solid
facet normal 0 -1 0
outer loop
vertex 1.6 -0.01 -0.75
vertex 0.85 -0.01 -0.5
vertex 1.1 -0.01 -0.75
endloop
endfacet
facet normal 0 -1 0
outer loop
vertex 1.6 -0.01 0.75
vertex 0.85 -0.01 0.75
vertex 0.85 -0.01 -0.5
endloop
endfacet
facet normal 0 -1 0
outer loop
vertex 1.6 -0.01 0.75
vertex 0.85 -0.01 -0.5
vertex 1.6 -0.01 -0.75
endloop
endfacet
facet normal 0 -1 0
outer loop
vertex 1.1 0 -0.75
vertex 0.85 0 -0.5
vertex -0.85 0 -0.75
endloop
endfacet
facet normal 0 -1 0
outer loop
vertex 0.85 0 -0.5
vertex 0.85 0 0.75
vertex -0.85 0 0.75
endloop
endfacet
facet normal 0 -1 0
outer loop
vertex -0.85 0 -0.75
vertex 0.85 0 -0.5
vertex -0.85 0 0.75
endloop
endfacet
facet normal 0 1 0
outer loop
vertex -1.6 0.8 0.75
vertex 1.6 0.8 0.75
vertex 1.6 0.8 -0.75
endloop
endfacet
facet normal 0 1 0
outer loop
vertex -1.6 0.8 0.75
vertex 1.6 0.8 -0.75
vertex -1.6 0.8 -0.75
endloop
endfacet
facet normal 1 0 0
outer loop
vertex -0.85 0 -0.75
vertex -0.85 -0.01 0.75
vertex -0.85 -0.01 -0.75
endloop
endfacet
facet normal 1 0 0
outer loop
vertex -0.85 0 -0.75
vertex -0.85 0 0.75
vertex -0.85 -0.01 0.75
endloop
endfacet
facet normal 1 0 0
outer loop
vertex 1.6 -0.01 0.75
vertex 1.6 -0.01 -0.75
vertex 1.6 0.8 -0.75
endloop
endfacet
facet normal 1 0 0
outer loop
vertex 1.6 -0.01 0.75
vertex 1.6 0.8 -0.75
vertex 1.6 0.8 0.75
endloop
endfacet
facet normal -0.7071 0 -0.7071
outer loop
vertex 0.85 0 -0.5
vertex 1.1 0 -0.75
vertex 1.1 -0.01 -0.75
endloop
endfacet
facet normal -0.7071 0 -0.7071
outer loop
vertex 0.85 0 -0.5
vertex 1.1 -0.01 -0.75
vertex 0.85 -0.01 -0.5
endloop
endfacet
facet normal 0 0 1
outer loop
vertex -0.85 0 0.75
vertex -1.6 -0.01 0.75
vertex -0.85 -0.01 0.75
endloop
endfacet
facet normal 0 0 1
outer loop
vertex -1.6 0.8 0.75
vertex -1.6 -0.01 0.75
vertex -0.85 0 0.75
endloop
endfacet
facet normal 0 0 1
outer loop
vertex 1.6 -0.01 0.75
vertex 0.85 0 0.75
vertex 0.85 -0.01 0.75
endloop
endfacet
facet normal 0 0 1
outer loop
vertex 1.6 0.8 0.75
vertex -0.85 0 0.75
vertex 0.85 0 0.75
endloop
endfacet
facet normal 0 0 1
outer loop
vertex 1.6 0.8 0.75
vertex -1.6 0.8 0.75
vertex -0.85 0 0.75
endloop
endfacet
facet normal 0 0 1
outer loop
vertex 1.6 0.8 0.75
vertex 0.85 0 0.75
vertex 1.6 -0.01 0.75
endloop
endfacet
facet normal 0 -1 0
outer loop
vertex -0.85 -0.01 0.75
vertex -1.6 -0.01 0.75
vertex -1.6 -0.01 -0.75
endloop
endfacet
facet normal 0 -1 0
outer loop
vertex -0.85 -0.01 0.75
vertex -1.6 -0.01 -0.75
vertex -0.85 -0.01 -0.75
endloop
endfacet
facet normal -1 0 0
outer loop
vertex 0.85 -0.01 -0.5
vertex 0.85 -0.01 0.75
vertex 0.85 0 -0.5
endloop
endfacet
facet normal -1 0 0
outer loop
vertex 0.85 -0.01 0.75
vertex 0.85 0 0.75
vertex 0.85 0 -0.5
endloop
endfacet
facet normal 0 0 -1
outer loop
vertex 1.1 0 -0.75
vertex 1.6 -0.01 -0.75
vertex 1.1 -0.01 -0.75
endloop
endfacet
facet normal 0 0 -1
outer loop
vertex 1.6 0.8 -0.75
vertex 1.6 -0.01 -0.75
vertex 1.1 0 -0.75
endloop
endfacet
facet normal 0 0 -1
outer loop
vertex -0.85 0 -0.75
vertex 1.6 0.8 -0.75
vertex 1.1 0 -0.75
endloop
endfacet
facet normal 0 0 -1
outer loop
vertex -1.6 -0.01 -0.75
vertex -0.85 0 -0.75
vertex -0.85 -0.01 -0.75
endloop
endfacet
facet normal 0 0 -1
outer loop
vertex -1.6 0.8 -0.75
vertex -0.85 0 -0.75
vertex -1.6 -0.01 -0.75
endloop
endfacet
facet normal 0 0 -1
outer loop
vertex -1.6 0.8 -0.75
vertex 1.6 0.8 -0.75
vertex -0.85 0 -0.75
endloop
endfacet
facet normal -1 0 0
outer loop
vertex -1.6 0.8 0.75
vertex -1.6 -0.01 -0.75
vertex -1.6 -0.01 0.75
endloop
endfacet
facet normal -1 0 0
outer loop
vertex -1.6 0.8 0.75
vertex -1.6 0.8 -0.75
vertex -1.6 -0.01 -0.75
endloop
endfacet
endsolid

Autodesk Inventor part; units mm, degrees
ref_plane "YZ Plane" through (0, 0, 0) normal (1, 0, 0) x (0, 1, 0)
ref_plane "XZ Plane" through (0, 0, 0) normal (0, 1, 0) x (-1, 0, 0)
ref_plane "XY Plane" through (0, 0, 0) normal (0, 0, 1) x (1, 0, 0)
sketch "Sketch1" plane through (0, 0, 0) normal (0, 1, 0) x (-1, 0, 0)
  line L0 (1.6, -0.75) -> (-1.6, -0.75)
  line L1 (-1.6, -0.75) -> (-1.6, 0.75)
  line L2 (-1.6, 0.75) -> (1.6, 0.75)
  line L3 (1.6, 0.75) -> (1.6, -0.75)
  line L4 (1.6, -0.75) -> (-1.6, 0.75) construction
  line L5 (-1.6, -0.75) -> (1.6, 0.75) construction
  point P0 (0, 0)
  dimension "d2" = 3.2
  dimension "d3" = 1.5
extrude "Extrusion1" add sketch "Sketch1" along normal blind 0.8
sketch "Sketch2" plane through (0, 0, 0) normal (0, -1, 0) x (1, 0, 0)
  line L0 (1.6, 0.75) -> (1.6, -0.75) projected
  line L1 (1.6, 0.75) -> (0.85, 0.75)
  line L2 (0.85, 0.75) -> (0.85, -0.5)
  line L3 (1.1, -0.75) -> (1.6, -0.75)
  line L4 (1.6, -0.75) -> (1.6, 0.75)
  circle A0 centre (0.85, -0.75) radius 0.25 construction
  line L5 (1.1, -0.75) -> (0.85, -0.5)
  point P0 (0, 0)
  dimension "d7" = 0.5
  dimension "d8" = 0.75
extrude "Extrusion2" add sketch "Sketch2" along normal blind 0.01
sketch "Sketch3" plane through (0, 0, 0) normal (0, -1, 0) x (1, 0, 0)
  line L0 (-1.6, 0.75) -> (1.6, 0.75) projected
  line L1 (-1.6, 0.75) -> (-0.85, 0.75)
  line L2 (-0.85, 0.75) -> (-0.85, -0.75)
  line L3 (-0.85, -0.75) -> (-1.6, -0.75)
  line L4 (-1.6, -0.75) -> (-1.6, 0.75)
  point P0 (0, 0)
  dimension "d11" = 0.75
  dimension "d12" = 1.5
extrude "Extrusion3" add sketch "Sketch3" along normal blind 0.01
properties part number "32kHz-crystal"
